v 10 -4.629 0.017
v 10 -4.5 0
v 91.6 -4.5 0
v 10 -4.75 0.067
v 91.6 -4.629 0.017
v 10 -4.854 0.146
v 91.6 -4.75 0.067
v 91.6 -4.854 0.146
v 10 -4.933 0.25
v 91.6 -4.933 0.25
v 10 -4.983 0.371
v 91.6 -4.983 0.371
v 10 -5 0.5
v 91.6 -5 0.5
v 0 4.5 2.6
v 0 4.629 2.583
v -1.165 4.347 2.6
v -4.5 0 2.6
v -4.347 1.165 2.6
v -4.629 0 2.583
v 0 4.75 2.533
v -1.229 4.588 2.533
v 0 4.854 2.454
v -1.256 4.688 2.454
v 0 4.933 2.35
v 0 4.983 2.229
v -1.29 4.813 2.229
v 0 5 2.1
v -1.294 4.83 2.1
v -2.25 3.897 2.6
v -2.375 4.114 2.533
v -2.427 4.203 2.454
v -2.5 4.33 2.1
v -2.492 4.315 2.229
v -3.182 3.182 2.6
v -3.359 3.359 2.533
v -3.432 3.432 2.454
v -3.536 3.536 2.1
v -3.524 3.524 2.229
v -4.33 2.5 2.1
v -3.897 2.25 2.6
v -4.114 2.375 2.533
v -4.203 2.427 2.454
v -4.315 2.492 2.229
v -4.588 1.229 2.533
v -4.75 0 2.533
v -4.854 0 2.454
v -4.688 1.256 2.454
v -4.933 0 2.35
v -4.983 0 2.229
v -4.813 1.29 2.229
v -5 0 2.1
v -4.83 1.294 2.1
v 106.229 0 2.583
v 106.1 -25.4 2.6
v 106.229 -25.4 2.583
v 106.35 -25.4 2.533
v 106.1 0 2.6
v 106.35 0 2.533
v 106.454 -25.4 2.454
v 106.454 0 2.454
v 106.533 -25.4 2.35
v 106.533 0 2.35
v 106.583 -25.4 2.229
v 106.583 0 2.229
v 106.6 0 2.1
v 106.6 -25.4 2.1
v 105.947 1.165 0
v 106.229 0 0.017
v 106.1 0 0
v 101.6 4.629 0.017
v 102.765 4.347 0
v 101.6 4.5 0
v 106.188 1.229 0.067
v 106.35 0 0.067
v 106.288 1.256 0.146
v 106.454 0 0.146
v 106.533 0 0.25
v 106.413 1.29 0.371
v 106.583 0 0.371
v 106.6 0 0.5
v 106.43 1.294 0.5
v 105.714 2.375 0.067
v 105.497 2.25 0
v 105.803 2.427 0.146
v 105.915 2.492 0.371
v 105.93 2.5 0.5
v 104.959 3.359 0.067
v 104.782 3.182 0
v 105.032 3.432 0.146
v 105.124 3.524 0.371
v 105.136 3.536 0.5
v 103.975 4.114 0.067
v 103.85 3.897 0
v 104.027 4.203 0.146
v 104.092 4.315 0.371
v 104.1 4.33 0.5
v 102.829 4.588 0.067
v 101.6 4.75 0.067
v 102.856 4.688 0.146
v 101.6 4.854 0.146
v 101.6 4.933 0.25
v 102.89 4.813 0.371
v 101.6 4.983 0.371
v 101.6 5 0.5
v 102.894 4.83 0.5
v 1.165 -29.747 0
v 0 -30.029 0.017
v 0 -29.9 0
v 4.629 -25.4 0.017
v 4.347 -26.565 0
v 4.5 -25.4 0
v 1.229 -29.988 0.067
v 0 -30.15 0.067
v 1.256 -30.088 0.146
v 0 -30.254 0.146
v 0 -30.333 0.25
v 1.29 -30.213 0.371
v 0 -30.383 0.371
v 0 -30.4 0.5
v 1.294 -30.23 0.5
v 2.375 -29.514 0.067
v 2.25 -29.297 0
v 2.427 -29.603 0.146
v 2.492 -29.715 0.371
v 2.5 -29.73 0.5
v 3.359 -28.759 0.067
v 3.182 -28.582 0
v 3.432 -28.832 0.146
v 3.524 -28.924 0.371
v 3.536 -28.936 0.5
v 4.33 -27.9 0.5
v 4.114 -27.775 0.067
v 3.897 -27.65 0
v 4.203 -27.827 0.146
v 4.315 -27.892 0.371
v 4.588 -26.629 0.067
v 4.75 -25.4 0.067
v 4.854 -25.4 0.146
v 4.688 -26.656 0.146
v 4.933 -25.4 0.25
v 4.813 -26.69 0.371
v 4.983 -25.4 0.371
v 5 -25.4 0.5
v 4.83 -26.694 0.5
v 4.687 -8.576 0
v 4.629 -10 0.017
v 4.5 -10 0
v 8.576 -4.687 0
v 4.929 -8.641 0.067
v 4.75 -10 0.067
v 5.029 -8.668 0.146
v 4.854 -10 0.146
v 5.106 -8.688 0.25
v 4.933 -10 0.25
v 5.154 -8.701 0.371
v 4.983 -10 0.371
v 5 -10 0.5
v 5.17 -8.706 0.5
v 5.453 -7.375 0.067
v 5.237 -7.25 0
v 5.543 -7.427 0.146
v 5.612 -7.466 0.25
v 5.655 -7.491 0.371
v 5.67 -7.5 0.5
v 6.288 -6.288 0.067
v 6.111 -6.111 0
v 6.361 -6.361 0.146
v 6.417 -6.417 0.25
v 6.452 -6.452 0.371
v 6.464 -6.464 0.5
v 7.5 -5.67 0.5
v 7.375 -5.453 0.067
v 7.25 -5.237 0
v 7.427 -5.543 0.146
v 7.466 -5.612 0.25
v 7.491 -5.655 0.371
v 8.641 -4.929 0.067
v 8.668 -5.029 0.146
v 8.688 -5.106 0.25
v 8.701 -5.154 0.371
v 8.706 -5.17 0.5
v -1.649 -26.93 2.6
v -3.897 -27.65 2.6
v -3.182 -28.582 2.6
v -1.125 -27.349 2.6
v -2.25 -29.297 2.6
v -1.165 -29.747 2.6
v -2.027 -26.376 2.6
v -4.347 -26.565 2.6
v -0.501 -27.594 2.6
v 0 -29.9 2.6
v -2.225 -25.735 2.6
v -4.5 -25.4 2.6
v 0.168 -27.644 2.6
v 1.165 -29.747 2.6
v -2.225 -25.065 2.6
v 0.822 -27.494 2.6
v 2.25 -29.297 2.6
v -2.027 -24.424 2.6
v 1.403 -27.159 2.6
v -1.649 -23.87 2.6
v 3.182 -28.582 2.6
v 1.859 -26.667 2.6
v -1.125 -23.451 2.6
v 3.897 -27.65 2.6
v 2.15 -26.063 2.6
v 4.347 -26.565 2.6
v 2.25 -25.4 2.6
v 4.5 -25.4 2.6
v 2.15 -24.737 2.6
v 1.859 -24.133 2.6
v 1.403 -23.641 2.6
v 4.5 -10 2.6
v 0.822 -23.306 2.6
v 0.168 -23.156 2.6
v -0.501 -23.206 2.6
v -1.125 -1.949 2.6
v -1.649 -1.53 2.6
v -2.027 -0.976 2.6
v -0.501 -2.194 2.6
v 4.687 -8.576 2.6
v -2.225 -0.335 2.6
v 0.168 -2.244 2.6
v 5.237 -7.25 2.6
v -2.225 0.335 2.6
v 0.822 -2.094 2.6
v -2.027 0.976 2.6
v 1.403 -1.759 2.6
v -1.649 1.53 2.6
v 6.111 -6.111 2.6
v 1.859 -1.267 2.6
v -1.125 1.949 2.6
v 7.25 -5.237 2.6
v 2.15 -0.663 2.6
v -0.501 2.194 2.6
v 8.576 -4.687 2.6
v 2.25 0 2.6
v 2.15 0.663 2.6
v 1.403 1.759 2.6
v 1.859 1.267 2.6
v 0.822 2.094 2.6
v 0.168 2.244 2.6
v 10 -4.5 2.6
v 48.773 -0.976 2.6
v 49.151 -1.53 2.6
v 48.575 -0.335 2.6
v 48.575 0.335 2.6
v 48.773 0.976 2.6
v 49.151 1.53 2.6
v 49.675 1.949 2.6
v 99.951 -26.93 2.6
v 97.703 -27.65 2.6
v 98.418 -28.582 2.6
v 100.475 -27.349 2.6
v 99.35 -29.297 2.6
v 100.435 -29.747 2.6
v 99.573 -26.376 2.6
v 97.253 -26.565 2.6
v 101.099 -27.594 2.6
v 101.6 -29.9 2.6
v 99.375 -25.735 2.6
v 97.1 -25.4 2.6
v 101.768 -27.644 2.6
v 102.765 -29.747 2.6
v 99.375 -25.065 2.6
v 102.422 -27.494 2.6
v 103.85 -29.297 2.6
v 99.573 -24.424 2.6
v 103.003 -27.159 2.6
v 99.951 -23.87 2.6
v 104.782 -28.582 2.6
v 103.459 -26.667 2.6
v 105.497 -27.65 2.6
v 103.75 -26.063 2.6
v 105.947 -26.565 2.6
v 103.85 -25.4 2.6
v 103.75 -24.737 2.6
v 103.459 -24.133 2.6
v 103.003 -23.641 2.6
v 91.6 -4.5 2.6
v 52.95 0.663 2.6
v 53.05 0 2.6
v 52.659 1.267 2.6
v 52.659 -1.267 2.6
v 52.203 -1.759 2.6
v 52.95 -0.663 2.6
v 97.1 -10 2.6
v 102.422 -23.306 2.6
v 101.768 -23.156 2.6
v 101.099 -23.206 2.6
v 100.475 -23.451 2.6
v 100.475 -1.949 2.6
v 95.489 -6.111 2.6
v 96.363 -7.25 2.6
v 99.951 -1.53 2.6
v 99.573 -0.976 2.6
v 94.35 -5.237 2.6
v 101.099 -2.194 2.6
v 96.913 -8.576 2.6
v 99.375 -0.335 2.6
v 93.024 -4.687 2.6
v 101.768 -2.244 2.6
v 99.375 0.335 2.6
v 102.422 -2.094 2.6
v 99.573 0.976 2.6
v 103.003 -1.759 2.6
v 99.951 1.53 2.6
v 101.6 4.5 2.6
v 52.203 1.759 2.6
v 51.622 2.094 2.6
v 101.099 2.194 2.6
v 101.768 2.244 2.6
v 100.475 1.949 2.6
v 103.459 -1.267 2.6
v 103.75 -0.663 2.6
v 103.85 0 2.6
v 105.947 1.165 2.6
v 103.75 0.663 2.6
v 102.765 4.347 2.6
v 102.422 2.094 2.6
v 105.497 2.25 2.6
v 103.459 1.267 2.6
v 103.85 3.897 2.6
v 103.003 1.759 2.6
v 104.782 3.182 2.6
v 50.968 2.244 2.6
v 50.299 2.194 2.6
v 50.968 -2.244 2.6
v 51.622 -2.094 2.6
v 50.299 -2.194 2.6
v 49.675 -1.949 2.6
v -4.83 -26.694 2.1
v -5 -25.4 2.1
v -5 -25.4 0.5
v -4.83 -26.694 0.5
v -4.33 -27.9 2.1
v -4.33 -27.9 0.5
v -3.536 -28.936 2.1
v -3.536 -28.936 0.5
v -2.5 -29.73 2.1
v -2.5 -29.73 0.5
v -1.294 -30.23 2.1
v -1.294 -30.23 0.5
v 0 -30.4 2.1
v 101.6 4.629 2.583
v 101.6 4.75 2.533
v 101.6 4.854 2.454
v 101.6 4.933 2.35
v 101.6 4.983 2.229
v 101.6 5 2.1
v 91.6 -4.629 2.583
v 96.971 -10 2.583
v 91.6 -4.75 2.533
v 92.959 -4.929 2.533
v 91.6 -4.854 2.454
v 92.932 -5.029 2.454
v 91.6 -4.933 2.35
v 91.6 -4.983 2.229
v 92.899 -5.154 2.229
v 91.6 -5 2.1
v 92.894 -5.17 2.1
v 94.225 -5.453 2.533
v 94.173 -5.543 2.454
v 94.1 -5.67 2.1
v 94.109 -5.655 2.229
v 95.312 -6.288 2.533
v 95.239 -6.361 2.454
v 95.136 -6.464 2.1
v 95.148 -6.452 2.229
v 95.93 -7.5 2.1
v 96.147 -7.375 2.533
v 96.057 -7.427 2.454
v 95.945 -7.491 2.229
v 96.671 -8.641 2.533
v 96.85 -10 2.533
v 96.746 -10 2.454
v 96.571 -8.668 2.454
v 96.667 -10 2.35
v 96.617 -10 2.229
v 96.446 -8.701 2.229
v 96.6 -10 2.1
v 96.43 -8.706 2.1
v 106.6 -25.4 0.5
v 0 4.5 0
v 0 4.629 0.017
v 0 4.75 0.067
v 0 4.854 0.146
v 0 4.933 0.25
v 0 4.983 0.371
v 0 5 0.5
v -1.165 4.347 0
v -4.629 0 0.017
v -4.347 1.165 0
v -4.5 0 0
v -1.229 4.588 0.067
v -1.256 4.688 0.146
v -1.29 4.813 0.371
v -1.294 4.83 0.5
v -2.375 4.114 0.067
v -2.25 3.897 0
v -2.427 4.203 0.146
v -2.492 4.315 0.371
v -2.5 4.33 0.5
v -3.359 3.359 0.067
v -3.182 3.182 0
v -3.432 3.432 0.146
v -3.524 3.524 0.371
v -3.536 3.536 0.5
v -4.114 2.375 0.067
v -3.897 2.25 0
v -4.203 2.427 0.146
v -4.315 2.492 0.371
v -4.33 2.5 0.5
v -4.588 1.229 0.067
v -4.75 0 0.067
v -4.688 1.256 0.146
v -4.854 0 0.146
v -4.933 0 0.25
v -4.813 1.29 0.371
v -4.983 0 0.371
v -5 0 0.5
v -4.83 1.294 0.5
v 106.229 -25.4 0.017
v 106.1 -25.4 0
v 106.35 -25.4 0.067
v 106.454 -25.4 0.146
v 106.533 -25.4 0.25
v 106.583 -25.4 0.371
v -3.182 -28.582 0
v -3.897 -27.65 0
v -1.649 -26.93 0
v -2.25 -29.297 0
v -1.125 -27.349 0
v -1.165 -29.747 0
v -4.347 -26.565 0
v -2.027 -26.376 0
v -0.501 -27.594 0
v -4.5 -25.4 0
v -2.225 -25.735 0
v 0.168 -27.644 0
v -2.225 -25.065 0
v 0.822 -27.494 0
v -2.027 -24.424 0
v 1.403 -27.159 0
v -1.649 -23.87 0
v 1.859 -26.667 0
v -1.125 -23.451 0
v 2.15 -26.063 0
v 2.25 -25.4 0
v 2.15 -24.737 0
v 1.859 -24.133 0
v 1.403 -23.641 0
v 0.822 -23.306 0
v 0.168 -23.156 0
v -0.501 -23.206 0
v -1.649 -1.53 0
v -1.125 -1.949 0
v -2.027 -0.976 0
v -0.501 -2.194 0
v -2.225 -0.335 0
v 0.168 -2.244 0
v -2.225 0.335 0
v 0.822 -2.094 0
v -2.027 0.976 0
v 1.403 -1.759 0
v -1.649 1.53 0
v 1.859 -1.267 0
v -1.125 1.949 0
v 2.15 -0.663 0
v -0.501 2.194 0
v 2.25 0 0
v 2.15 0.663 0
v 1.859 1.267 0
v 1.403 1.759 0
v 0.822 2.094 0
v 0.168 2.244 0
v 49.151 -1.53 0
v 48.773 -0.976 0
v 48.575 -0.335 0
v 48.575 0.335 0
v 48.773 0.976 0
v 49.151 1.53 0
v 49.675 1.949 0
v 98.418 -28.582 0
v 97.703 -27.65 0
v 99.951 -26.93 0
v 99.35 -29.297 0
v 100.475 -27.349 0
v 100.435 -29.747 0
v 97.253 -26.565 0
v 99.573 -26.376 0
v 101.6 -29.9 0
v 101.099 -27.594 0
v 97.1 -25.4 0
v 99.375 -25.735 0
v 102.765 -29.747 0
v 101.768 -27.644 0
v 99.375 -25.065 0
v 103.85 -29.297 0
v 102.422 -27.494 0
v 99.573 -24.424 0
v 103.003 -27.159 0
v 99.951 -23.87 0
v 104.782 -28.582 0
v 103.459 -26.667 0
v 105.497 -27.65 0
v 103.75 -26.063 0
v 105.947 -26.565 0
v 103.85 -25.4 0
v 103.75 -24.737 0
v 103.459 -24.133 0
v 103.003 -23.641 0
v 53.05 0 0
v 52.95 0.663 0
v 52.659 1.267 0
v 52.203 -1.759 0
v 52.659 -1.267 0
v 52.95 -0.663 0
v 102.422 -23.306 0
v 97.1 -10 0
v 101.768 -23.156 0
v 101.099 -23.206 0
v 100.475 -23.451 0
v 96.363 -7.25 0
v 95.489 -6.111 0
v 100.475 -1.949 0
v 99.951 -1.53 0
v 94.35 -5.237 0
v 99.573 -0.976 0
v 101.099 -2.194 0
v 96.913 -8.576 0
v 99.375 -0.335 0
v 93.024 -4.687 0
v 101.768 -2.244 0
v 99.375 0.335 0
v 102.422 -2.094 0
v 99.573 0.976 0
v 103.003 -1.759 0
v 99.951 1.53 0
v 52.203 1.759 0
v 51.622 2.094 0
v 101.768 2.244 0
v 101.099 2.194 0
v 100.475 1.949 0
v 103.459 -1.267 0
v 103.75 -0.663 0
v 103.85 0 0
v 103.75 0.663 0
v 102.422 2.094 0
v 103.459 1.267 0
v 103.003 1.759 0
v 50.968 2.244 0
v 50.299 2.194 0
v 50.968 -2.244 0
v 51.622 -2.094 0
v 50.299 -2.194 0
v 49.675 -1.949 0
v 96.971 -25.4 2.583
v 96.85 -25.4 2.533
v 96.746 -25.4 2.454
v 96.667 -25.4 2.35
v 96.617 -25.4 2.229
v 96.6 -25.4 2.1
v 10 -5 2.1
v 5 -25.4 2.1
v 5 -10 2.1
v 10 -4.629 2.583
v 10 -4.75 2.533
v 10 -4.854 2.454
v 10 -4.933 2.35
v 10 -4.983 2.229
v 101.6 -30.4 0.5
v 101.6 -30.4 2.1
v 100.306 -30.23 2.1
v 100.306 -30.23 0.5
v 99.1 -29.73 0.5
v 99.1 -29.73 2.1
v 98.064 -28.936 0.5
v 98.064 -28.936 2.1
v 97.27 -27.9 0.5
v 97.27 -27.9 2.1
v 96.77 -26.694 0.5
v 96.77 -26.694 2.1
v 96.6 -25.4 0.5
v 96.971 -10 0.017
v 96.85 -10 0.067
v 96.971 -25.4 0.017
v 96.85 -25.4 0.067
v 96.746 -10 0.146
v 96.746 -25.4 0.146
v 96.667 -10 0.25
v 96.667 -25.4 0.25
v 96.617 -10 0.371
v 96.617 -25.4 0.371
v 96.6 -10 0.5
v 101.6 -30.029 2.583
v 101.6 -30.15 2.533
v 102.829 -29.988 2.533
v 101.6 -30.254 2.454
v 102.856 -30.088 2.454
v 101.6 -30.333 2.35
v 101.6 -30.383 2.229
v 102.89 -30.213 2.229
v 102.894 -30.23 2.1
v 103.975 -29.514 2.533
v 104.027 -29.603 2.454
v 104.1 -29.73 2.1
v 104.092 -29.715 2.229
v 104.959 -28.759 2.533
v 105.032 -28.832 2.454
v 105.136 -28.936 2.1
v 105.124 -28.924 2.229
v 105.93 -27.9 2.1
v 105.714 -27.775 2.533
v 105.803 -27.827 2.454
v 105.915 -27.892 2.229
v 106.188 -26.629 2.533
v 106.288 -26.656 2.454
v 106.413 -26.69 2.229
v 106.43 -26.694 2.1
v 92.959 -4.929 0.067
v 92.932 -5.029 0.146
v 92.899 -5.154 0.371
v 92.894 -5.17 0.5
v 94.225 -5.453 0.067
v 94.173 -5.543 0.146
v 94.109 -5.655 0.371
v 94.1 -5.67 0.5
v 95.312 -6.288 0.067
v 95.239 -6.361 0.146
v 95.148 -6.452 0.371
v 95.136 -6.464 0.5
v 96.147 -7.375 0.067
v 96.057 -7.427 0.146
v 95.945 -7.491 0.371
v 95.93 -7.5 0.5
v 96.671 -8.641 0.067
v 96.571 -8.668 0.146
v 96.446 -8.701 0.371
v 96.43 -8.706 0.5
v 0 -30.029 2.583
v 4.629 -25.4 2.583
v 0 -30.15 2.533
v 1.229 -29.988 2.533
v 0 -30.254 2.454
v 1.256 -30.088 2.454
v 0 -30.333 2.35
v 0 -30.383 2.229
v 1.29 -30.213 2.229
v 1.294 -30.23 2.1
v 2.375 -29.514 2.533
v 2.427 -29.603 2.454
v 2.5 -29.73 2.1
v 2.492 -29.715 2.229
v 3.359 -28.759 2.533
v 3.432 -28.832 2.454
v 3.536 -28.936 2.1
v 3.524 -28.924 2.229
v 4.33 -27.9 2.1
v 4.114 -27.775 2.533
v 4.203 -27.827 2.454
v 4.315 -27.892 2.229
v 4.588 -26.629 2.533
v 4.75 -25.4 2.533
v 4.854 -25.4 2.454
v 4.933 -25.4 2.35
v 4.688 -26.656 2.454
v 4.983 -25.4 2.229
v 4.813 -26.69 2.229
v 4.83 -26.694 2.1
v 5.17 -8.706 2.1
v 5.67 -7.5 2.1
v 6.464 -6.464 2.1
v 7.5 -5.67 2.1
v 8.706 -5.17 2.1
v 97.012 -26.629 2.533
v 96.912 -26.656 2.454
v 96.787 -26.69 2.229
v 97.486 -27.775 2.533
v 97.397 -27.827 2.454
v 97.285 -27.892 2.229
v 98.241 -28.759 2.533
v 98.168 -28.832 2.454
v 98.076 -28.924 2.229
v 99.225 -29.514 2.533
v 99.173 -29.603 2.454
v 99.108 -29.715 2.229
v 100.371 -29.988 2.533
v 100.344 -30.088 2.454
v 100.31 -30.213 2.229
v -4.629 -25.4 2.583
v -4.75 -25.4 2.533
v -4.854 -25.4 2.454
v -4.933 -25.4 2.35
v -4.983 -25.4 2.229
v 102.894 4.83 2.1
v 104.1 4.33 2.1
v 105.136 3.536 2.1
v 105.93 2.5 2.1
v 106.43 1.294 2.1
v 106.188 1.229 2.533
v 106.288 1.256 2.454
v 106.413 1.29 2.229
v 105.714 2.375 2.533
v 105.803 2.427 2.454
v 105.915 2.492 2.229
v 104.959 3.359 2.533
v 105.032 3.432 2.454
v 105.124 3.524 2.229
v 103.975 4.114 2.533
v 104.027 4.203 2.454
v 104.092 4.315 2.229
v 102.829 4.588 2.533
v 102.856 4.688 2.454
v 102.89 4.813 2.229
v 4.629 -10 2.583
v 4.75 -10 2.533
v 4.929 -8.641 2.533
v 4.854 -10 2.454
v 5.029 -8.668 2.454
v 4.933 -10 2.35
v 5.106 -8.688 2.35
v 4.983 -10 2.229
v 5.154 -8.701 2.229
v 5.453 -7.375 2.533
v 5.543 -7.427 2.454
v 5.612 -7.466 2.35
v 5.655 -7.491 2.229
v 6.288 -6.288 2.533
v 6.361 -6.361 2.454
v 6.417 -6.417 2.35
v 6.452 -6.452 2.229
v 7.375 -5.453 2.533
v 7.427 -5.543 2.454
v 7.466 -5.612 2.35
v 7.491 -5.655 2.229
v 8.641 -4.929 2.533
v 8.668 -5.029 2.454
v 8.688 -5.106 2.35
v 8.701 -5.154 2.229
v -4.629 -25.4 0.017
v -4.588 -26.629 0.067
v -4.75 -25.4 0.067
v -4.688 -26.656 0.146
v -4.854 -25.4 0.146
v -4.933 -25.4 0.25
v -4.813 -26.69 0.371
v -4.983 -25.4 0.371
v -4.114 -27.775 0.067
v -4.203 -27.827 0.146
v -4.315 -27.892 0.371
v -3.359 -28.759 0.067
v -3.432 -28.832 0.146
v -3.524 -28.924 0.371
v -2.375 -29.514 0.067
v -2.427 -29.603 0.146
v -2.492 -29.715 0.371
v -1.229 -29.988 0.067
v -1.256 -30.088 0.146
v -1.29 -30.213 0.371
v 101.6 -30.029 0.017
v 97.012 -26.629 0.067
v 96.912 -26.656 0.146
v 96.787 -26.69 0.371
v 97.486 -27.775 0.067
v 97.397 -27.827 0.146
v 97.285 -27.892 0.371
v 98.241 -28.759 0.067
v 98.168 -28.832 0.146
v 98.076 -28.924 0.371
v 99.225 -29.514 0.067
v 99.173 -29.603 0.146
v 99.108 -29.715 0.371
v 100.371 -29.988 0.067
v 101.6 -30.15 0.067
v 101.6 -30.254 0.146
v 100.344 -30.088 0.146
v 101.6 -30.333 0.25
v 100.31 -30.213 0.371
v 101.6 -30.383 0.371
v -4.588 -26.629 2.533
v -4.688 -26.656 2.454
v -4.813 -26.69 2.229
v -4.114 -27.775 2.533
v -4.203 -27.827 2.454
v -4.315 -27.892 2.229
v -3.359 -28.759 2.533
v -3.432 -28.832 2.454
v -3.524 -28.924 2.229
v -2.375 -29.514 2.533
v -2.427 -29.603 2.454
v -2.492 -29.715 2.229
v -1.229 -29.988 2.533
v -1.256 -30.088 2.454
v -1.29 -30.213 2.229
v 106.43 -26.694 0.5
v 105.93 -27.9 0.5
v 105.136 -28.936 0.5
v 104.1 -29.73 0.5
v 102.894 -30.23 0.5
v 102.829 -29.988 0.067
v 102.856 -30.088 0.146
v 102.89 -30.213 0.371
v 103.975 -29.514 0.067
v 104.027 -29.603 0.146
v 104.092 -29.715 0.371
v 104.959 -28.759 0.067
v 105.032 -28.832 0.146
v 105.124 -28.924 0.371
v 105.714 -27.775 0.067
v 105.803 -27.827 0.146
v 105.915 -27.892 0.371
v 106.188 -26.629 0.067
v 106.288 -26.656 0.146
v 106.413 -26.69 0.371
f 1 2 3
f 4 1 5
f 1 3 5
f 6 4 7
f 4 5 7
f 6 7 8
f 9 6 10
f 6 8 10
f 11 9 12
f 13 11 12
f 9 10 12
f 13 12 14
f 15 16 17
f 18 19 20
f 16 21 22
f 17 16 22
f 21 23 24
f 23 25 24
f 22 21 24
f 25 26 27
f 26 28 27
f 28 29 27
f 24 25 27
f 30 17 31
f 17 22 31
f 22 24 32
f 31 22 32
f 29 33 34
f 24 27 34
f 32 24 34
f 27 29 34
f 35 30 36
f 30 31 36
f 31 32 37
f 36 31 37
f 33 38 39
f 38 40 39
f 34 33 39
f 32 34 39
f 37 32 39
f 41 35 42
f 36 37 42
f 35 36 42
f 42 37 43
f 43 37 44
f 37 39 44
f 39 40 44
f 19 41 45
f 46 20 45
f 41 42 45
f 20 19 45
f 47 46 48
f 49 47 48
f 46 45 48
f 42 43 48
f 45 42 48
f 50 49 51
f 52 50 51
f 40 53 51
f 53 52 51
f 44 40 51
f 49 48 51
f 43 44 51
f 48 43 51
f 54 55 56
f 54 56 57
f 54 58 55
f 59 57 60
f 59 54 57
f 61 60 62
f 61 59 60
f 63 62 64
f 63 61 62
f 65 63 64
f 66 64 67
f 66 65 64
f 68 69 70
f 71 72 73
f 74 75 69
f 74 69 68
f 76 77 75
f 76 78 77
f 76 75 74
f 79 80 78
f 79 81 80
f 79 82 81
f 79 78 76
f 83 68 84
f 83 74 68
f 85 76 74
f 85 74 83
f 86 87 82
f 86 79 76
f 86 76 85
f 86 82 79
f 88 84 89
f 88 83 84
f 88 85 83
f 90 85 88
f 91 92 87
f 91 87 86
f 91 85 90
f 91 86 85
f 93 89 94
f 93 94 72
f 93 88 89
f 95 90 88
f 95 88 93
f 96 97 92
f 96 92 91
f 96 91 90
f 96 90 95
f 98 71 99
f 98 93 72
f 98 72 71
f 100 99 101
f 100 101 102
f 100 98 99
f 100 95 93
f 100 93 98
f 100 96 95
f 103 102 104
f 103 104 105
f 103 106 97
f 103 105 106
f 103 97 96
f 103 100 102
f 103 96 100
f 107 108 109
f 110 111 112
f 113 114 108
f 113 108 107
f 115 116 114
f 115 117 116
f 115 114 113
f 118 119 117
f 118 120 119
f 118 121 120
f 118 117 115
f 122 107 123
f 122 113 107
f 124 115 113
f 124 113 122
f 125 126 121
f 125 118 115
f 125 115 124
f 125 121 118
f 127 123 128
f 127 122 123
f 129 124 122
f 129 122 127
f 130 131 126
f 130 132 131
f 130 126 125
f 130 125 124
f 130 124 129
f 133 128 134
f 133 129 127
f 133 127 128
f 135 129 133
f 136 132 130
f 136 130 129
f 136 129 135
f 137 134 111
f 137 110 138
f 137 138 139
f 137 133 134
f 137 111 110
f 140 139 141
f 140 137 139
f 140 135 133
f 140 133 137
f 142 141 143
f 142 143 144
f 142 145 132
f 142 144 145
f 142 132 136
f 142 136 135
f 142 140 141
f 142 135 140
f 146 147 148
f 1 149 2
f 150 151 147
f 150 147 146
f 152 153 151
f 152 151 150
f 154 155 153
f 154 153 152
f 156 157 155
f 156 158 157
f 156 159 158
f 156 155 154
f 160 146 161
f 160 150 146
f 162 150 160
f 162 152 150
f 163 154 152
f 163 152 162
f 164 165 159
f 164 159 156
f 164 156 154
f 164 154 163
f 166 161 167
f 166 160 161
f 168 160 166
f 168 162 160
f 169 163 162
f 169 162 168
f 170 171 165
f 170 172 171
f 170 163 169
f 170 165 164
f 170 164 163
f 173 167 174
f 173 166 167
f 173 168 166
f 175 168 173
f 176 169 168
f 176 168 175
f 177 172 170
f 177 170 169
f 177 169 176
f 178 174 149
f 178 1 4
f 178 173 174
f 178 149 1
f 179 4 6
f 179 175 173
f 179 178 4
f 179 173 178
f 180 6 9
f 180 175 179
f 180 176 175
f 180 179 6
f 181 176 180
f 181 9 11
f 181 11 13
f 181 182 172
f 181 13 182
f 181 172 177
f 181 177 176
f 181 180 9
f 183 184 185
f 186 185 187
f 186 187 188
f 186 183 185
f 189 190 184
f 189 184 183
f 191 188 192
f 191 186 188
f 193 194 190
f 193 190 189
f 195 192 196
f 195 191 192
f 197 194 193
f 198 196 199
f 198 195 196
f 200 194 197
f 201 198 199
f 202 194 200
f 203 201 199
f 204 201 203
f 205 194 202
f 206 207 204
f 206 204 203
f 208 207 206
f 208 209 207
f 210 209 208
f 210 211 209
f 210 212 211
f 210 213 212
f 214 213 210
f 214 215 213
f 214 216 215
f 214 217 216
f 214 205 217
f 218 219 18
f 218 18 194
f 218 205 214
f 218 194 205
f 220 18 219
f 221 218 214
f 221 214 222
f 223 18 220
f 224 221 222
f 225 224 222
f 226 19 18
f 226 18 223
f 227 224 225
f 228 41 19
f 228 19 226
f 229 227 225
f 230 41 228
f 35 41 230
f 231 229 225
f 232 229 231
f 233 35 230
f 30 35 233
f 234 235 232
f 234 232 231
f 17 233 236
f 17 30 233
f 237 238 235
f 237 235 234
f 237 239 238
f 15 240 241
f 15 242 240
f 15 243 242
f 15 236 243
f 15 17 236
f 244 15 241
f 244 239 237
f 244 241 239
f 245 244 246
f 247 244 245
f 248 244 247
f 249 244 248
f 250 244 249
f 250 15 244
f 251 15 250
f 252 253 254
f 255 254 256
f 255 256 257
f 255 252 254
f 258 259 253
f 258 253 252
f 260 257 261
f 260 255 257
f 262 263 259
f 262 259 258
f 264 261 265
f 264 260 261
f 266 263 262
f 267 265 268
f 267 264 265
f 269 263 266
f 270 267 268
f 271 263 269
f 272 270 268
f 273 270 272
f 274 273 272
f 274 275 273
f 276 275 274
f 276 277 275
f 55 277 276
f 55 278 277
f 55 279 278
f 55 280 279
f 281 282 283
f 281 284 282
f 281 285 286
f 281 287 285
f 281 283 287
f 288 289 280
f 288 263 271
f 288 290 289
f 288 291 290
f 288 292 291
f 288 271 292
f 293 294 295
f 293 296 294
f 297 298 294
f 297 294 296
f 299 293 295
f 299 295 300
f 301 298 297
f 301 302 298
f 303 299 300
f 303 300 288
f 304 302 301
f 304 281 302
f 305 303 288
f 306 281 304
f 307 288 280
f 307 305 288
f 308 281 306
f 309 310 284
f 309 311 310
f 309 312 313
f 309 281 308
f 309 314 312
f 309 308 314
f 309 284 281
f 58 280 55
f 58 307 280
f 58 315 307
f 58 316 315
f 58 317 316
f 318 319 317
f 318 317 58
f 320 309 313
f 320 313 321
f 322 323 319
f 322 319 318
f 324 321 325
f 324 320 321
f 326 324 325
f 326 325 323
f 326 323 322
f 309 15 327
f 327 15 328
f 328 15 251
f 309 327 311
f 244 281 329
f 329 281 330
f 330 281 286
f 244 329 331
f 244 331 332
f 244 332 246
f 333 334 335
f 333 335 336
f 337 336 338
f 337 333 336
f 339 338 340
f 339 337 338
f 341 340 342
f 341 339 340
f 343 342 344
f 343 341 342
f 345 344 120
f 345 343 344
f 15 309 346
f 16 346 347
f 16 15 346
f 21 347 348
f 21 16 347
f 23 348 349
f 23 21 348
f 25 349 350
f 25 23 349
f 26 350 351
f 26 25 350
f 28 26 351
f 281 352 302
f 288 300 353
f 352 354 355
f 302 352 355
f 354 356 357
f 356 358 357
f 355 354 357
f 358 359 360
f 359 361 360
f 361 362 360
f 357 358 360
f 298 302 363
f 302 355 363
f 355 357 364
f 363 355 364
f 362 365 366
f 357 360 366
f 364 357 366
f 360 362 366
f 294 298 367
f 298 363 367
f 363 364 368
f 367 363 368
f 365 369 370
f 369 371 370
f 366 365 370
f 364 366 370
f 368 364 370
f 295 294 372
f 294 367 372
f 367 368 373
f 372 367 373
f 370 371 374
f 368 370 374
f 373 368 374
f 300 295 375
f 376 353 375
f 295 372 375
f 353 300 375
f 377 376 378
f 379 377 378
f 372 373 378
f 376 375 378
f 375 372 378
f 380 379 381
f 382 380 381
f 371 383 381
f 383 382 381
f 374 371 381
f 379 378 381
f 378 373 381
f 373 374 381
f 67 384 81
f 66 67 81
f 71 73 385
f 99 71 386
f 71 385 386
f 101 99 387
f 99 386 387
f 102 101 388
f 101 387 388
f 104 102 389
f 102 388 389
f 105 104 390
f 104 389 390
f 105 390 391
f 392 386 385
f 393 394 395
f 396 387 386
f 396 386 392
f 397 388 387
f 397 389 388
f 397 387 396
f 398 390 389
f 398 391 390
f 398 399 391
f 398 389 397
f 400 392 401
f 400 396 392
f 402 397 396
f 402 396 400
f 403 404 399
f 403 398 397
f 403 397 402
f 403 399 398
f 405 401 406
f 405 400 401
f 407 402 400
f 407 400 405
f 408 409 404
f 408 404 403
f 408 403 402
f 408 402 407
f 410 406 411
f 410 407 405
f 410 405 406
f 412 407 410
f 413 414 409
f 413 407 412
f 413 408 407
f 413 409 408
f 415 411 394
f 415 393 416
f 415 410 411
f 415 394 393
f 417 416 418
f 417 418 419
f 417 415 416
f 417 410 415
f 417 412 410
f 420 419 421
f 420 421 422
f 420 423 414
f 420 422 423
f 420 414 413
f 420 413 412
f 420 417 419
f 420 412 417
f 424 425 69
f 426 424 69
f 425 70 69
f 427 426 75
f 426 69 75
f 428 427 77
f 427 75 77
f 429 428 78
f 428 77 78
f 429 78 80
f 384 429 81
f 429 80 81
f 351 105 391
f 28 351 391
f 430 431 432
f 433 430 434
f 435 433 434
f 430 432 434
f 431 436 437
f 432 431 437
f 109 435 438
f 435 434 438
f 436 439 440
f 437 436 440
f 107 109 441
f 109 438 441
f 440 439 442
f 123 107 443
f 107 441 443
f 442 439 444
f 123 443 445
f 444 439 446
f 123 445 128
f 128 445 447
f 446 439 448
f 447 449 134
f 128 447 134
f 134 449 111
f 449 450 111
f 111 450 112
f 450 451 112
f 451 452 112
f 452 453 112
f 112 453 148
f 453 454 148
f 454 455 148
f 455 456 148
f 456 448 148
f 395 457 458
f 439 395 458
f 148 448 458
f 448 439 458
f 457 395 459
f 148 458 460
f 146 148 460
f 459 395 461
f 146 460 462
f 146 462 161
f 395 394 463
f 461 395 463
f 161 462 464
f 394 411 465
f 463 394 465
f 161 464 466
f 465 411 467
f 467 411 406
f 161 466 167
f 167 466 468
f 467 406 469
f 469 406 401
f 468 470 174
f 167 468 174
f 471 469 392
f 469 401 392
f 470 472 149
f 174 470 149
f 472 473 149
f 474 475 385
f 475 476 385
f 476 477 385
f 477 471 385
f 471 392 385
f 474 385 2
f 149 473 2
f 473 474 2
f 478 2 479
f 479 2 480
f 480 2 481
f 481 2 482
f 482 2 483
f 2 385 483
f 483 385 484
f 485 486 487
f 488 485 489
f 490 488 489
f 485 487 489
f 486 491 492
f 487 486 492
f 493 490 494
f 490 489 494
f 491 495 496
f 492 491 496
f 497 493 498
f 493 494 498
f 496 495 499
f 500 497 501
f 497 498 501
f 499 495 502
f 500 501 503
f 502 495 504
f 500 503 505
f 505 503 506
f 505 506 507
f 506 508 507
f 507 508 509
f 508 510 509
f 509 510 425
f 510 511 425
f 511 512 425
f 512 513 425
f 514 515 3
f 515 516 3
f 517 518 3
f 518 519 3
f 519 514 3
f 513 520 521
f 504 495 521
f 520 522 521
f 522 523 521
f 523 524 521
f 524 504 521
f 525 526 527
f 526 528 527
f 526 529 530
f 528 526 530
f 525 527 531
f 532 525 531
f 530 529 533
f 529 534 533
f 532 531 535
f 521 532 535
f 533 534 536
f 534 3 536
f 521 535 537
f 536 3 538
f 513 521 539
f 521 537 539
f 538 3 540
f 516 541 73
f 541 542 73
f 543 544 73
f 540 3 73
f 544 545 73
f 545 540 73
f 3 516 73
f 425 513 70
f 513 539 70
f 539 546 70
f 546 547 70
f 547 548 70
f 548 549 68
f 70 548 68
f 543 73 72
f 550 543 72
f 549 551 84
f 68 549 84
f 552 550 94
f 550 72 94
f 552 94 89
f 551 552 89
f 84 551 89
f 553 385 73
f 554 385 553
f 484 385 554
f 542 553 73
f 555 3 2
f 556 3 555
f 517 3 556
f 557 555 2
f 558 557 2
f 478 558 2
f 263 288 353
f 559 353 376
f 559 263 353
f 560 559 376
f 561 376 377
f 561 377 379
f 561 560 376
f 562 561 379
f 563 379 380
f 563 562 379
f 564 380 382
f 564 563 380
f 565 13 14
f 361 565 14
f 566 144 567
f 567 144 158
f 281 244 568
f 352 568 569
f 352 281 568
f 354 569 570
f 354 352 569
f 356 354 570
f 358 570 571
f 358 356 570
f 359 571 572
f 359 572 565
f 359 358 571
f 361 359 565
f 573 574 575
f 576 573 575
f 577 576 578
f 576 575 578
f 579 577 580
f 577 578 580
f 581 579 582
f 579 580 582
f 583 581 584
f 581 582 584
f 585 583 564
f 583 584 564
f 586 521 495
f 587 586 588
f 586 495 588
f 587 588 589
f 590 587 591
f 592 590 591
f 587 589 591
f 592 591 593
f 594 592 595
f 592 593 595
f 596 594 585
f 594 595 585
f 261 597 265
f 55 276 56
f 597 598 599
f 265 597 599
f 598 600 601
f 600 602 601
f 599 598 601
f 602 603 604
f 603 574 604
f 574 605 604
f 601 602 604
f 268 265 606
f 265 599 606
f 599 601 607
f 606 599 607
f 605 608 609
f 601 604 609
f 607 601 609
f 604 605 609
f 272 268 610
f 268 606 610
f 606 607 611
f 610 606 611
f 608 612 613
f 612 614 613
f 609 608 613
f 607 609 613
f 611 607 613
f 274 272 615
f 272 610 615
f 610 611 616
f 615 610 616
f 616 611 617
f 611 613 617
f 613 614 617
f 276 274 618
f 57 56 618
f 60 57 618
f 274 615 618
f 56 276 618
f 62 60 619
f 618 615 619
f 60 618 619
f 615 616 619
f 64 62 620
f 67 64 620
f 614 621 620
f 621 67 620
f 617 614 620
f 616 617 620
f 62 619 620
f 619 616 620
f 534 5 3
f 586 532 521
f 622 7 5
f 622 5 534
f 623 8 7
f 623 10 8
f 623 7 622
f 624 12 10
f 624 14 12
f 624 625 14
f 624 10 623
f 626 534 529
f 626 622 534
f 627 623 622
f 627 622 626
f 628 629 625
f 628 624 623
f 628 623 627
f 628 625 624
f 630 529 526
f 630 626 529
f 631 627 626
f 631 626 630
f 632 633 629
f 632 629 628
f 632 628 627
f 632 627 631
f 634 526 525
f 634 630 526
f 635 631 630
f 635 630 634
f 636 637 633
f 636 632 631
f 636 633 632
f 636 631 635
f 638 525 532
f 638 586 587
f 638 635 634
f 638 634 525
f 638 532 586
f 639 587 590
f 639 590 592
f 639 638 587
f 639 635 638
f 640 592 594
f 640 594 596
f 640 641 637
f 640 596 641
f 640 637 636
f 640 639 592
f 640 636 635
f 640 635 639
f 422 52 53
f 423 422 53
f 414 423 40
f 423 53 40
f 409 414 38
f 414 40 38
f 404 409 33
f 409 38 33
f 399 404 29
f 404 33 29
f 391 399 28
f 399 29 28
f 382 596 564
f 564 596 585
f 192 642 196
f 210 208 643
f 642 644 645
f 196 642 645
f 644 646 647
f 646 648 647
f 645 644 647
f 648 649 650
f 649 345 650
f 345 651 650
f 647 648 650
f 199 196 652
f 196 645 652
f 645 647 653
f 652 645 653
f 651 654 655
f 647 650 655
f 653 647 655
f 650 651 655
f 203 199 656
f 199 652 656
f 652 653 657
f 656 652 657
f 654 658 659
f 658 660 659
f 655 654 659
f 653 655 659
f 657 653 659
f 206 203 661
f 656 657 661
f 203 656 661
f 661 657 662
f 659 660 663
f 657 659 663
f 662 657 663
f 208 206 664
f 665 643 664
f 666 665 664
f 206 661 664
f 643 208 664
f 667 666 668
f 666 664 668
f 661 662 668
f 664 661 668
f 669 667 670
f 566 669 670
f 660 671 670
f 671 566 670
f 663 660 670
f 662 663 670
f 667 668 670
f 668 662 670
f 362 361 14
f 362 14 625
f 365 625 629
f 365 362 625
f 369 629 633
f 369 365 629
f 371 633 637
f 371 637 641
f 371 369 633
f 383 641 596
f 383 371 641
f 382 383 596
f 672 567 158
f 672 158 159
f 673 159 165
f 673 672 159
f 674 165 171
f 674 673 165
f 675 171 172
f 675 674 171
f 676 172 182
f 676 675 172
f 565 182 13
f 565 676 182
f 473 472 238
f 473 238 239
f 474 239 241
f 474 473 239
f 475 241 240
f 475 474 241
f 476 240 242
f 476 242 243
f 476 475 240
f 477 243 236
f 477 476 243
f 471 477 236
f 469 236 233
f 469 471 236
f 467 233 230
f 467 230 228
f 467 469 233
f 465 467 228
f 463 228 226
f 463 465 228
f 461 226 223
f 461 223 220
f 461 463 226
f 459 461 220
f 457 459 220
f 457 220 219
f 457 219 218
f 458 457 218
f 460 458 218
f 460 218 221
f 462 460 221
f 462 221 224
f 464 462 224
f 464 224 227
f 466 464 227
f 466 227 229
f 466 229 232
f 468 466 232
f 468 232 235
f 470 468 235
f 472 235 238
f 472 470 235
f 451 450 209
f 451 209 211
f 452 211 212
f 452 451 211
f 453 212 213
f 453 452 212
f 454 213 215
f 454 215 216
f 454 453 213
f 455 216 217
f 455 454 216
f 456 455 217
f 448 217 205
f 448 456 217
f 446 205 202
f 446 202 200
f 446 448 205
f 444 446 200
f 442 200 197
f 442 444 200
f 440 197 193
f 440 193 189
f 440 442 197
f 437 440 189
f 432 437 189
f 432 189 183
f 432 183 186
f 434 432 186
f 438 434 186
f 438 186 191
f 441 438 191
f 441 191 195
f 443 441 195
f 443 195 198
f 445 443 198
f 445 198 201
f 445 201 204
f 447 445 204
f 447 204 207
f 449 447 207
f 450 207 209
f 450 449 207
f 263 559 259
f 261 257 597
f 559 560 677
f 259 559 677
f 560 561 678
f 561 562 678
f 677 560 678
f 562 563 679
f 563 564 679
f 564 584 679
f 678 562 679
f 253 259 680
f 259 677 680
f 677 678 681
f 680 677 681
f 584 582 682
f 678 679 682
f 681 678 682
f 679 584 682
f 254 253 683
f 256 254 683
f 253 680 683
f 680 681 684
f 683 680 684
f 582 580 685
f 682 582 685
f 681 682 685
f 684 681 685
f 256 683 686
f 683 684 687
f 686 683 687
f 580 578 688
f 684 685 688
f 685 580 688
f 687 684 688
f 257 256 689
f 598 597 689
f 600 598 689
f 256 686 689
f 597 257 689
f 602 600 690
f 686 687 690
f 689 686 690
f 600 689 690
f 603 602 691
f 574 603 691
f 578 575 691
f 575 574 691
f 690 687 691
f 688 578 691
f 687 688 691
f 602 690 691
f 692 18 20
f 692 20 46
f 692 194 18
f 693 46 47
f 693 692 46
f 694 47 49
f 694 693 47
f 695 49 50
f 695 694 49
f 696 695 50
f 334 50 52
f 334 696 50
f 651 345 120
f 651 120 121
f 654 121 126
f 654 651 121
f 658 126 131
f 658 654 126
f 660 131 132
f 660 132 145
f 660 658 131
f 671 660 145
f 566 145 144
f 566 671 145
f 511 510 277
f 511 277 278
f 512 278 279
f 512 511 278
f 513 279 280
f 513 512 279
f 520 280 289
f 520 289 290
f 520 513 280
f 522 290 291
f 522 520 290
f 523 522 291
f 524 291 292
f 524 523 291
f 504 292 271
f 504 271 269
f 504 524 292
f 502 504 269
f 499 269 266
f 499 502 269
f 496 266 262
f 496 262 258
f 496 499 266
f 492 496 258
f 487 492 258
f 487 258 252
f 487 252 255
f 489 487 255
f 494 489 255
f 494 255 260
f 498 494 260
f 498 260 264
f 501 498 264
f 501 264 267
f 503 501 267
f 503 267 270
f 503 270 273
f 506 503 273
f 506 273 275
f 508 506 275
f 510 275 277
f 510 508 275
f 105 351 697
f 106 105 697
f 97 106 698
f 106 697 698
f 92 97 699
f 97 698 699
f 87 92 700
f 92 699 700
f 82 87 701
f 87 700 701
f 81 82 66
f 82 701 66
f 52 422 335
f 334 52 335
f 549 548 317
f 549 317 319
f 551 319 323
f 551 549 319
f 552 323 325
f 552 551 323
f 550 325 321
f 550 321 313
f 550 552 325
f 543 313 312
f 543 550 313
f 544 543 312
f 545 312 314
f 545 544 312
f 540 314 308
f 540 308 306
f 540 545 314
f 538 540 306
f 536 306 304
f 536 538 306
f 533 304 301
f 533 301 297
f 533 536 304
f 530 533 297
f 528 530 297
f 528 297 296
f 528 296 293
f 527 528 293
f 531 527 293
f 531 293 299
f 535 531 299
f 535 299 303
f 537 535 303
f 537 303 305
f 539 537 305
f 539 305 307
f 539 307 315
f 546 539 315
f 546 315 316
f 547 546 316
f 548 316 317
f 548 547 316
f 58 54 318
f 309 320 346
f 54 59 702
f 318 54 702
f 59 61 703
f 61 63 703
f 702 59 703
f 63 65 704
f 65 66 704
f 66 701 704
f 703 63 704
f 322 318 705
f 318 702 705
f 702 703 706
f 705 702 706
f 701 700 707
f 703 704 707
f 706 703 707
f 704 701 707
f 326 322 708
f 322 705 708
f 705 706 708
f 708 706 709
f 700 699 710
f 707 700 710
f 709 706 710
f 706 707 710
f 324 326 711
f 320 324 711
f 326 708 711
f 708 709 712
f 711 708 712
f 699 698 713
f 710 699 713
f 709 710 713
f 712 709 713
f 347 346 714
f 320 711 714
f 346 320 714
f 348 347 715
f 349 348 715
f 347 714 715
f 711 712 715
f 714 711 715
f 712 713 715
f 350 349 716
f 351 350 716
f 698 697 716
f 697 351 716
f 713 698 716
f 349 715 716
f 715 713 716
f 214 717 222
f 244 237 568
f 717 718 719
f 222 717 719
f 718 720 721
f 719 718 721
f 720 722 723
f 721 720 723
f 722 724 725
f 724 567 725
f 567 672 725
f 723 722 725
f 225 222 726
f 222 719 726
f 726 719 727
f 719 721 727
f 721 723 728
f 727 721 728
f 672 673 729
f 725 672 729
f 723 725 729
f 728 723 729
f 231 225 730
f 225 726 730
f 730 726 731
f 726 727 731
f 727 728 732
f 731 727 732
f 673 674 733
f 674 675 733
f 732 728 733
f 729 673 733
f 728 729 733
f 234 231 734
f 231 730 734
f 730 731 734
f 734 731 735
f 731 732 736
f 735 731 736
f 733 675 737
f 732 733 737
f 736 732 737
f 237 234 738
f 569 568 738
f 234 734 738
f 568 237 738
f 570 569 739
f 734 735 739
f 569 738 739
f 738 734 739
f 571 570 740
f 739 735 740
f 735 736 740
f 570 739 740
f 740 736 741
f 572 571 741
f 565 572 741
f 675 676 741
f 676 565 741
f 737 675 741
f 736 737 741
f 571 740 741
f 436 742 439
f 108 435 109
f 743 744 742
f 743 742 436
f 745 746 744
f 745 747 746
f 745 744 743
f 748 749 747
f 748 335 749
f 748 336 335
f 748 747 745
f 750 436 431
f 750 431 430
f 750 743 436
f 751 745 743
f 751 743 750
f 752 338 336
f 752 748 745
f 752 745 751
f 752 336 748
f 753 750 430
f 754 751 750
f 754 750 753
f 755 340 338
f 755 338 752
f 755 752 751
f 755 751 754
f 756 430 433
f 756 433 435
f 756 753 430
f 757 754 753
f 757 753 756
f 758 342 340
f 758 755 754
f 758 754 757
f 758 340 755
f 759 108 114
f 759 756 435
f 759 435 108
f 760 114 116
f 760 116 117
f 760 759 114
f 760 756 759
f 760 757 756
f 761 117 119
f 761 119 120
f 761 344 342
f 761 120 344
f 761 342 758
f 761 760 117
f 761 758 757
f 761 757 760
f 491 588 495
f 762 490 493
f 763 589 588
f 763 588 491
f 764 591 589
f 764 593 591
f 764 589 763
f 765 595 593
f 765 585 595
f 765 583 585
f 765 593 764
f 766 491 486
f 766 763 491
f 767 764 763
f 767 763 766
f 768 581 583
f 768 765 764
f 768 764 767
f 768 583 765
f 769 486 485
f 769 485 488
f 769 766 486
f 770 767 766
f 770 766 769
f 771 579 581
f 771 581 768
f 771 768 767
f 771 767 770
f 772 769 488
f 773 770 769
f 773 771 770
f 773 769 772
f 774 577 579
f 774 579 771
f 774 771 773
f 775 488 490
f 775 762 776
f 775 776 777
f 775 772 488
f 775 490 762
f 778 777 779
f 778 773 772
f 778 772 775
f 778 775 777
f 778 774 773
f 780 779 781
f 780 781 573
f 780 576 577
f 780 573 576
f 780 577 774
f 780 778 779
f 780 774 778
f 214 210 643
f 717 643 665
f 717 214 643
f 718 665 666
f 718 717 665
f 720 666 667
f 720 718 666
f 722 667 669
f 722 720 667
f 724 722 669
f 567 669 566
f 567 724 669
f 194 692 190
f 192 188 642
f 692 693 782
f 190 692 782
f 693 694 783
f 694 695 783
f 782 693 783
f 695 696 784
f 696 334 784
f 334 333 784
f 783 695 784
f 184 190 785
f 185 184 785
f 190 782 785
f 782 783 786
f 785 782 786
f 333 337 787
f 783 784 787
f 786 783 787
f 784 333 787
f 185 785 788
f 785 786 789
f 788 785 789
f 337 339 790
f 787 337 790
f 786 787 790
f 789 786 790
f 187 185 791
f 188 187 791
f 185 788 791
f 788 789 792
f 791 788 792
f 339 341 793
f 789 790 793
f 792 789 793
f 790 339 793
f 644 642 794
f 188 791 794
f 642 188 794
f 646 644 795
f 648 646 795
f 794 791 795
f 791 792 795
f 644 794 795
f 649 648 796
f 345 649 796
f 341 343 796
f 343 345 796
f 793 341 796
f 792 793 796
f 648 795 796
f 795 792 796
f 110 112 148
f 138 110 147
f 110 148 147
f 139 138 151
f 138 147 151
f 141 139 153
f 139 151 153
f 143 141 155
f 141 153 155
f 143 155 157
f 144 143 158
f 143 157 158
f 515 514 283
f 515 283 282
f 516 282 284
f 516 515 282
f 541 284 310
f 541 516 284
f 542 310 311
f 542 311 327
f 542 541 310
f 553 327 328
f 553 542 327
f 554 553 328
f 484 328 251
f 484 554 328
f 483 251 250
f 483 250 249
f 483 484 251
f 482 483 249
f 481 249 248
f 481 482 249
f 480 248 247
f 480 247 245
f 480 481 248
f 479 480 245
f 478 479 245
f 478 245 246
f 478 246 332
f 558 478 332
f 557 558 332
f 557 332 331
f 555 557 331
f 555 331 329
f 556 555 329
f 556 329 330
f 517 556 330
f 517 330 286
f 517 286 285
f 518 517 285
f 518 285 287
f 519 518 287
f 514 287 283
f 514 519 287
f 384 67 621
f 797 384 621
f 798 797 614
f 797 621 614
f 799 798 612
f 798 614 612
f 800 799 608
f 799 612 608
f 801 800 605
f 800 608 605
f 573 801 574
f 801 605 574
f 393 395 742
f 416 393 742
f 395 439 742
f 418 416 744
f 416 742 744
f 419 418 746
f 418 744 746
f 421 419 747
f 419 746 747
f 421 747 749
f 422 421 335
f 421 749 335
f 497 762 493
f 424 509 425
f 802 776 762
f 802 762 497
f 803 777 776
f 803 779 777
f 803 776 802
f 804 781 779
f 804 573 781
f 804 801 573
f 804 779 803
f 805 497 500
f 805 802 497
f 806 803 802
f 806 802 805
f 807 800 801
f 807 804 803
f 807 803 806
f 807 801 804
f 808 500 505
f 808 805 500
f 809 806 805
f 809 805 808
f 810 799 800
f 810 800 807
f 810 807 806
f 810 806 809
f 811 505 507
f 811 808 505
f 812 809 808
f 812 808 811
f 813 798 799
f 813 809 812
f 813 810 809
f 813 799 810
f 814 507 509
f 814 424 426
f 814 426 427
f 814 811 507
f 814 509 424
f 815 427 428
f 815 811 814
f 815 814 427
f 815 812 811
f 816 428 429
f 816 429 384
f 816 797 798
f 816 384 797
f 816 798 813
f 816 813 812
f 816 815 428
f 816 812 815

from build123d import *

# Parameters (mm, degrees)
SKETCH1_R           = 2.25
BOSS_EXTRUDE1_DEPTH = 2.6
FILLET1_R           = 5
FILLET2_R           = 0.5


with BuildPart() as part:
    # Sketch1 → Boss-Extrude1 (new body)
    with BuildSketch(Plane.XY):
        Polygon((-5, 5), (-5, -30.4), (5, -30.4), (5, -5), (96.6, -5), (96.6, -30.4), (106.6, -30.4), (106.6, 5), align=None)
        Circle(SKETCH1_R, mode=Mode.SUBTRACT)
        with Locations((101.6, 0)):
            Circle(SKETCH1_R, mode=Mode.SUBTRACT)
        with Locations((0, -25.4)):
            Circle(SKETCH1_R, mode=Mode.SUBTRACT)
        with Locations((101.6, -25.4)):
            Circle(SKETCH1_R, mode=Mode.SUBTRACT)
        with Locations((50.8, 0)):
            Circle(SKETCH1_R, mode=Mode.SUBTRACT)
    extrude(amount=BOSS_EXTRUDE1_DEPTH)

    # Fillet1
    fillet1_edges = [part.edges().sort_by_distance(p)[0] for p in [
        (96.6, -30.4, 1.3),
        (106.6, -30.4, 1.3),
        (106.6, 5, 1.3),
        (96.6, -5, 1.3),
        (-5, 5, 1.3),
        (-5, -30.4, 1.3),
        (5, -30.4, 1.3),
        (5, -5, 1.3),
    ]]
    fillet(fillet1_edges, radius=FILLET1_R - 0.0001)  # a hair under: the kernel refuses the full size

    # Fillet2
    fillet2_edges = [part.edges().sort_by_distance(p)[0] for p in [
        (96.6, -17.7, 0),
        (50.8, -5, 0),
        (5, -17.7, 0),
        (-5, -12.7, 0),
        (50.8, 5, 0),
        (106.6, -12.7, 0),
        (3.535563195, -28.935563195, 0),
        (-3.535563195, -28.935563195, 0),
        (-3.535563195, 3.535563195, 0),
        (105.135563195, 3.535563195, 0),
        (105.135563195, -28.935563195, 0),
        (98.064436805, -28.935563195, 0),
        (96.6, -17.7, 2.6),
        (106.6, -12.7, 2.6),
        (50.8, 5, 2.6),
        (-5, -12.7, 2.6),
        (5, -17.7, 2.6),
        (50.8, -5, 2.6),
        (3.535563195, -28.935563195, 2.6),
        (-3.535563195, -28.935563195, 2.6),
        (-3.535563195, 3.535563195, 2.6),
        (105.135563195, 3.535563195, 2.6),
        (105.135563195, -28.935563195, 2.6),
        (98.064436805, -28.935563195, 2.6),
        (95.135563195, -6.464436805, 0),
        (95.135563195, -6.464436805, 2.6),
        (6.464436805, -6.464436805, 0),
        (6.464436805, -6.464436805, 2.6),
    ]]
    fillet(fillet2_edges, radius=FILLET2_R)


solid = part.part
